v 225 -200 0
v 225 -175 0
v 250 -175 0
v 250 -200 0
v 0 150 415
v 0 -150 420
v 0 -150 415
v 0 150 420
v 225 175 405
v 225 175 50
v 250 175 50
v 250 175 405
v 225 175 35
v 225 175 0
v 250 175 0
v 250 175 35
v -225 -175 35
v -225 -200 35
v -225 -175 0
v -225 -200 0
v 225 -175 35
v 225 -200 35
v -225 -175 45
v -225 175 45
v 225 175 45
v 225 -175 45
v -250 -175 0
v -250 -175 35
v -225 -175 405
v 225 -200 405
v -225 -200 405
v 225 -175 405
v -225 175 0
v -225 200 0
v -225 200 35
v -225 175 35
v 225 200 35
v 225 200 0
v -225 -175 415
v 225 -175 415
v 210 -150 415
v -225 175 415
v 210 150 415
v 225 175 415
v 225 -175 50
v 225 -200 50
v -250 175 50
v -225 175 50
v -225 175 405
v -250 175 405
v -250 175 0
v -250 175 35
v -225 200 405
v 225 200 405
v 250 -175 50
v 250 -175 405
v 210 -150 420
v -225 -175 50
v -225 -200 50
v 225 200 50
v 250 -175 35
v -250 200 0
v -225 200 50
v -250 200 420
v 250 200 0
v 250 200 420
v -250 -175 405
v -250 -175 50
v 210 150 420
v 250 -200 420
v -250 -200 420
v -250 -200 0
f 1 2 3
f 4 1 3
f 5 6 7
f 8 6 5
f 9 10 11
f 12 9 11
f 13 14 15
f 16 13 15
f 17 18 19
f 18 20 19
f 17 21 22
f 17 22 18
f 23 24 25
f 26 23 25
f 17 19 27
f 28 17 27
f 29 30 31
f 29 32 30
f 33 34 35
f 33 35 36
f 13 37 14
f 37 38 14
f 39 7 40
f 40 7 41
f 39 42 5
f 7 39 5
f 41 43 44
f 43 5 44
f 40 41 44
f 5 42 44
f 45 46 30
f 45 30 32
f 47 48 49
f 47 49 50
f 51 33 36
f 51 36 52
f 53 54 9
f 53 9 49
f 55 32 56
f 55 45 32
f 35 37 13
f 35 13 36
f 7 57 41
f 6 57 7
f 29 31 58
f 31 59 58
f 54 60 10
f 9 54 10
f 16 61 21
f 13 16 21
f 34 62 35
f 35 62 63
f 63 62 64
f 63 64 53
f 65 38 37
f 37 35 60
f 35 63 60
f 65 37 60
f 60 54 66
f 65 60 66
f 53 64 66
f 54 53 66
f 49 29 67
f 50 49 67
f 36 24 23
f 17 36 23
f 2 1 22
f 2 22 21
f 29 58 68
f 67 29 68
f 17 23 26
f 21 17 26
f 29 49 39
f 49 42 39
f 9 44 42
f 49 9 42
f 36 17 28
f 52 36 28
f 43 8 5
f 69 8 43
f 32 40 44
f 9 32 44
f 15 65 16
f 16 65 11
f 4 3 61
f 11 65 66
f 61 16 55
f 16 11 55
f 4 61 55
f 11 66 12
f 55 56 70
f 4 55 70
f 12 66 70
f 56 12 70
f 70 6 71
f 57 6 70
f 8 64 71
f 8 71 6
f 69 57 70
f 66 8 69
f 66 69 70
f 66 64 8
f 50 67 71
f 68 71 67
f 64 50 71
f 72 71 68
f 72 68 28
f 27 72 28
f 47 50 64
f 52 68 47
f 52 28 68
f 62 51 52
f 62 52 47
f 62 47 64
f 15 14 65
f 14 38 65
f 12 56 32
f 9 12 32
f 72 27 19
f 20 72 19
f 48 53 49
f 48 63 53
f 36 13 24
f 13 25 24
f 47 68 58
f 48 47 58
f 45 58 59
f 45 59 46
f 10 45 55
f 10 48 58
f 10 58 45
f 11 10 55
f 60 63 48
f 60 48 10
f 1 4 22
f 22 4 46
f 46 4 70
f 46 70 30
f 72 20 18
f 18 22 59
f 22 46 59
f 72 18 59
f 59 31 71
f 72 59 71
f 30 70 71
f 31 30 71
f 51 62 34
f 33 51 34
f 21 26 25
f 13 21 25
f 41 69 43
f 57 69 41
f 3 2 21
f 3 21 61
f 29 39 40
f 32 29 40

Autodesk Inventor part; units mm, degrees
ref_plane "YZ Plane" through (0, 0, 0) normal (1, 0, 0) x (0, 1, 0)
ref_plane "XZ Plane" through (0, 0, 0) normal (0, 1, 0) x (-1, 0, 0)
sketch "Sketch1" plane through (0, 0, 0) normal (0, 0, 1) x (1, 0, 0)
  line L0 (0, -10) -> (0, 10)
  line L1 (10, 0) -> (-10, 0)
  line L2 (225, 175) -> (250, 175)
  line L3 (250, 175) -> (250, 200)
  line L4 (250, 200) -> (225, 200)
  line L5 (225, 200) -> (225, 175)
  line L6 (-225, 175) -> (-250, 175)
  line L7 (-250, 175) -> (-250, 200)
  line L8 (-250, 200) -> (-225, 200)
  line L9 (-225, 200) -> (-225, 175)
  line L10 (225, -175) -> (250, -175)
  line L11 (250, -175) -> (250, -200)
  line L12 (250, -200) -> (225, -200)
  line L13 (225, -200) -> (225, -175)
  line L14 (-225, -200) -> (-225, -175)
  line L15 (-250, -200) -> (-225, -200)
  line L16 (-250, -175) -> (-250, -200)
  line L17 (-225, -175) -> (-250, -175)
  point P0 (0, 0)
  dimension "d0" = 20
  dimension "d1" = 20
  dimension "d2" = 25
  dimension "d3" = 25
  dimension "d4" = 500
  dimension "d5" = 400
extrude "Extrusion1" add sketch "Sketch1" along normal blind 420
ref_plane "Work Plane1" through (0, 0, 50) normal (0, 0, 1) x (1, 0, 0)
sketch "Sketch6" plane through (0, 0, 50) normal (0, 0, 1) x (1, 0, 0)
  line L0 (-250, -175) -> (-250, -200) projected
  line L1 (250, 175) -> (250, 200) projected
  line L2 (-250, -200) -> (250, -200)
  line L3 (250, -200) -> (250, 200)
  line L4 (250, 200) -> (-250, 200)
  line L5 (-250, 200) -> (-250, -200)
  point P0 (0, 0)
extrude "Extrusion6" add sketch "Sketch6" against normal blind 5
sketch "Sketch7" plane through (0, 0, 45) normal (0, 0, -1) x (-1, 0, 0)
  line L0 (250, -200) -> (225, -200) projected
  line L1 (-250, 200) -> (-225, 200) projected
  line L2 (250, -200) -> (-250, -200)
  line L3 (-250, -200) -> (-250, 200)
  line L4 (-250, 200) -> (250, 200)
  line L5 (250, 200) -> (250, -200)
  line L6 (225, -175) -> (250, -175) projected
  line L7 (-225, 175) -> (-225, 200) projected
  line L8 (225, -175) -> (-225, -175)
  line L9 (-225, -175) -> (-225, 175)
  line L10 (-225, 175) -> (225, 175)
  line L11 (225, 175) -> (225, -175)
  point P0 (0, 0)
extrude "Extrusion7" add sketch "Sketch7" along normal blind 10 contours L0 L2 L3 L1 L7 L9 L8 L6 L5 | L6 L11 L10 L7 L4 L5
sketch "Sketch8" plane through (0, 0, 420) normal (0, 0, 1) x (1, 0, 0)
  line L0 (-225, 200) -> (-250, 200) projected
  line L1 (250, -200) -> (250, -175) projected
  line L2 (-250, 200) -> (250, 200)
  line L3 (250, 200) -> (250, -200)
  line L4 (250, -200) -> (-250, -200)
  line L5 (-250, -200) -> (-250, 200)
  line L6 (0, 150) -> (210, 150)
  line L7 (210, 150) -> (210, -150)
  line L8 (210, -150) -> (0, -150)
  line L9 (0, -150) -> (0, 150)
  point P0 (0, 0)
  dimension "d26" = 50
  dimension "d29" = 40
  dimension "d30" = 50
  dimension "d31" = 210
  dimension "d32" = 300
extrude "Extrusion8" add sketch "Sketch8" against normal blind 5
sketch "Sketch9" plane through (0, 0, 415) normal (0, 0, -1) x (-1, 0, 0)
  line L0 (250, -175) -> (250, -200) projected
  line L1 (-250, 200) -> (-225, 200) projected
  line L2 (250, -200) -> (-250, -200)
  line L3 (-250, -200) -> (-250, 200)
  line L4 (-250, 200) -> (250, 200)
  line L5 (250, 200) -> (250, -200)
  line L6 (225, -175) -> (250, -175) projected
  line L7 (-250, 175) -> (-225, 175) projected
  line L8 (225, -175) -> (-225, -175)
  line L9 (-225, -175) -> (-225, 175)
  line L10 (-225, 175) -> (225, 175)
  line L11 (225, 175) -> (225, -175)
  point P0 (0, 0)
extrude "Extrusion9" add sketch "Sketch9" along normal blind 10 contours L6 L11 L10 L7 L3 L1 L4 L5 | L0 L2 L3 L7 L9 L8 L6
equation "\"d30\" = d26"
properties part number "Table"
